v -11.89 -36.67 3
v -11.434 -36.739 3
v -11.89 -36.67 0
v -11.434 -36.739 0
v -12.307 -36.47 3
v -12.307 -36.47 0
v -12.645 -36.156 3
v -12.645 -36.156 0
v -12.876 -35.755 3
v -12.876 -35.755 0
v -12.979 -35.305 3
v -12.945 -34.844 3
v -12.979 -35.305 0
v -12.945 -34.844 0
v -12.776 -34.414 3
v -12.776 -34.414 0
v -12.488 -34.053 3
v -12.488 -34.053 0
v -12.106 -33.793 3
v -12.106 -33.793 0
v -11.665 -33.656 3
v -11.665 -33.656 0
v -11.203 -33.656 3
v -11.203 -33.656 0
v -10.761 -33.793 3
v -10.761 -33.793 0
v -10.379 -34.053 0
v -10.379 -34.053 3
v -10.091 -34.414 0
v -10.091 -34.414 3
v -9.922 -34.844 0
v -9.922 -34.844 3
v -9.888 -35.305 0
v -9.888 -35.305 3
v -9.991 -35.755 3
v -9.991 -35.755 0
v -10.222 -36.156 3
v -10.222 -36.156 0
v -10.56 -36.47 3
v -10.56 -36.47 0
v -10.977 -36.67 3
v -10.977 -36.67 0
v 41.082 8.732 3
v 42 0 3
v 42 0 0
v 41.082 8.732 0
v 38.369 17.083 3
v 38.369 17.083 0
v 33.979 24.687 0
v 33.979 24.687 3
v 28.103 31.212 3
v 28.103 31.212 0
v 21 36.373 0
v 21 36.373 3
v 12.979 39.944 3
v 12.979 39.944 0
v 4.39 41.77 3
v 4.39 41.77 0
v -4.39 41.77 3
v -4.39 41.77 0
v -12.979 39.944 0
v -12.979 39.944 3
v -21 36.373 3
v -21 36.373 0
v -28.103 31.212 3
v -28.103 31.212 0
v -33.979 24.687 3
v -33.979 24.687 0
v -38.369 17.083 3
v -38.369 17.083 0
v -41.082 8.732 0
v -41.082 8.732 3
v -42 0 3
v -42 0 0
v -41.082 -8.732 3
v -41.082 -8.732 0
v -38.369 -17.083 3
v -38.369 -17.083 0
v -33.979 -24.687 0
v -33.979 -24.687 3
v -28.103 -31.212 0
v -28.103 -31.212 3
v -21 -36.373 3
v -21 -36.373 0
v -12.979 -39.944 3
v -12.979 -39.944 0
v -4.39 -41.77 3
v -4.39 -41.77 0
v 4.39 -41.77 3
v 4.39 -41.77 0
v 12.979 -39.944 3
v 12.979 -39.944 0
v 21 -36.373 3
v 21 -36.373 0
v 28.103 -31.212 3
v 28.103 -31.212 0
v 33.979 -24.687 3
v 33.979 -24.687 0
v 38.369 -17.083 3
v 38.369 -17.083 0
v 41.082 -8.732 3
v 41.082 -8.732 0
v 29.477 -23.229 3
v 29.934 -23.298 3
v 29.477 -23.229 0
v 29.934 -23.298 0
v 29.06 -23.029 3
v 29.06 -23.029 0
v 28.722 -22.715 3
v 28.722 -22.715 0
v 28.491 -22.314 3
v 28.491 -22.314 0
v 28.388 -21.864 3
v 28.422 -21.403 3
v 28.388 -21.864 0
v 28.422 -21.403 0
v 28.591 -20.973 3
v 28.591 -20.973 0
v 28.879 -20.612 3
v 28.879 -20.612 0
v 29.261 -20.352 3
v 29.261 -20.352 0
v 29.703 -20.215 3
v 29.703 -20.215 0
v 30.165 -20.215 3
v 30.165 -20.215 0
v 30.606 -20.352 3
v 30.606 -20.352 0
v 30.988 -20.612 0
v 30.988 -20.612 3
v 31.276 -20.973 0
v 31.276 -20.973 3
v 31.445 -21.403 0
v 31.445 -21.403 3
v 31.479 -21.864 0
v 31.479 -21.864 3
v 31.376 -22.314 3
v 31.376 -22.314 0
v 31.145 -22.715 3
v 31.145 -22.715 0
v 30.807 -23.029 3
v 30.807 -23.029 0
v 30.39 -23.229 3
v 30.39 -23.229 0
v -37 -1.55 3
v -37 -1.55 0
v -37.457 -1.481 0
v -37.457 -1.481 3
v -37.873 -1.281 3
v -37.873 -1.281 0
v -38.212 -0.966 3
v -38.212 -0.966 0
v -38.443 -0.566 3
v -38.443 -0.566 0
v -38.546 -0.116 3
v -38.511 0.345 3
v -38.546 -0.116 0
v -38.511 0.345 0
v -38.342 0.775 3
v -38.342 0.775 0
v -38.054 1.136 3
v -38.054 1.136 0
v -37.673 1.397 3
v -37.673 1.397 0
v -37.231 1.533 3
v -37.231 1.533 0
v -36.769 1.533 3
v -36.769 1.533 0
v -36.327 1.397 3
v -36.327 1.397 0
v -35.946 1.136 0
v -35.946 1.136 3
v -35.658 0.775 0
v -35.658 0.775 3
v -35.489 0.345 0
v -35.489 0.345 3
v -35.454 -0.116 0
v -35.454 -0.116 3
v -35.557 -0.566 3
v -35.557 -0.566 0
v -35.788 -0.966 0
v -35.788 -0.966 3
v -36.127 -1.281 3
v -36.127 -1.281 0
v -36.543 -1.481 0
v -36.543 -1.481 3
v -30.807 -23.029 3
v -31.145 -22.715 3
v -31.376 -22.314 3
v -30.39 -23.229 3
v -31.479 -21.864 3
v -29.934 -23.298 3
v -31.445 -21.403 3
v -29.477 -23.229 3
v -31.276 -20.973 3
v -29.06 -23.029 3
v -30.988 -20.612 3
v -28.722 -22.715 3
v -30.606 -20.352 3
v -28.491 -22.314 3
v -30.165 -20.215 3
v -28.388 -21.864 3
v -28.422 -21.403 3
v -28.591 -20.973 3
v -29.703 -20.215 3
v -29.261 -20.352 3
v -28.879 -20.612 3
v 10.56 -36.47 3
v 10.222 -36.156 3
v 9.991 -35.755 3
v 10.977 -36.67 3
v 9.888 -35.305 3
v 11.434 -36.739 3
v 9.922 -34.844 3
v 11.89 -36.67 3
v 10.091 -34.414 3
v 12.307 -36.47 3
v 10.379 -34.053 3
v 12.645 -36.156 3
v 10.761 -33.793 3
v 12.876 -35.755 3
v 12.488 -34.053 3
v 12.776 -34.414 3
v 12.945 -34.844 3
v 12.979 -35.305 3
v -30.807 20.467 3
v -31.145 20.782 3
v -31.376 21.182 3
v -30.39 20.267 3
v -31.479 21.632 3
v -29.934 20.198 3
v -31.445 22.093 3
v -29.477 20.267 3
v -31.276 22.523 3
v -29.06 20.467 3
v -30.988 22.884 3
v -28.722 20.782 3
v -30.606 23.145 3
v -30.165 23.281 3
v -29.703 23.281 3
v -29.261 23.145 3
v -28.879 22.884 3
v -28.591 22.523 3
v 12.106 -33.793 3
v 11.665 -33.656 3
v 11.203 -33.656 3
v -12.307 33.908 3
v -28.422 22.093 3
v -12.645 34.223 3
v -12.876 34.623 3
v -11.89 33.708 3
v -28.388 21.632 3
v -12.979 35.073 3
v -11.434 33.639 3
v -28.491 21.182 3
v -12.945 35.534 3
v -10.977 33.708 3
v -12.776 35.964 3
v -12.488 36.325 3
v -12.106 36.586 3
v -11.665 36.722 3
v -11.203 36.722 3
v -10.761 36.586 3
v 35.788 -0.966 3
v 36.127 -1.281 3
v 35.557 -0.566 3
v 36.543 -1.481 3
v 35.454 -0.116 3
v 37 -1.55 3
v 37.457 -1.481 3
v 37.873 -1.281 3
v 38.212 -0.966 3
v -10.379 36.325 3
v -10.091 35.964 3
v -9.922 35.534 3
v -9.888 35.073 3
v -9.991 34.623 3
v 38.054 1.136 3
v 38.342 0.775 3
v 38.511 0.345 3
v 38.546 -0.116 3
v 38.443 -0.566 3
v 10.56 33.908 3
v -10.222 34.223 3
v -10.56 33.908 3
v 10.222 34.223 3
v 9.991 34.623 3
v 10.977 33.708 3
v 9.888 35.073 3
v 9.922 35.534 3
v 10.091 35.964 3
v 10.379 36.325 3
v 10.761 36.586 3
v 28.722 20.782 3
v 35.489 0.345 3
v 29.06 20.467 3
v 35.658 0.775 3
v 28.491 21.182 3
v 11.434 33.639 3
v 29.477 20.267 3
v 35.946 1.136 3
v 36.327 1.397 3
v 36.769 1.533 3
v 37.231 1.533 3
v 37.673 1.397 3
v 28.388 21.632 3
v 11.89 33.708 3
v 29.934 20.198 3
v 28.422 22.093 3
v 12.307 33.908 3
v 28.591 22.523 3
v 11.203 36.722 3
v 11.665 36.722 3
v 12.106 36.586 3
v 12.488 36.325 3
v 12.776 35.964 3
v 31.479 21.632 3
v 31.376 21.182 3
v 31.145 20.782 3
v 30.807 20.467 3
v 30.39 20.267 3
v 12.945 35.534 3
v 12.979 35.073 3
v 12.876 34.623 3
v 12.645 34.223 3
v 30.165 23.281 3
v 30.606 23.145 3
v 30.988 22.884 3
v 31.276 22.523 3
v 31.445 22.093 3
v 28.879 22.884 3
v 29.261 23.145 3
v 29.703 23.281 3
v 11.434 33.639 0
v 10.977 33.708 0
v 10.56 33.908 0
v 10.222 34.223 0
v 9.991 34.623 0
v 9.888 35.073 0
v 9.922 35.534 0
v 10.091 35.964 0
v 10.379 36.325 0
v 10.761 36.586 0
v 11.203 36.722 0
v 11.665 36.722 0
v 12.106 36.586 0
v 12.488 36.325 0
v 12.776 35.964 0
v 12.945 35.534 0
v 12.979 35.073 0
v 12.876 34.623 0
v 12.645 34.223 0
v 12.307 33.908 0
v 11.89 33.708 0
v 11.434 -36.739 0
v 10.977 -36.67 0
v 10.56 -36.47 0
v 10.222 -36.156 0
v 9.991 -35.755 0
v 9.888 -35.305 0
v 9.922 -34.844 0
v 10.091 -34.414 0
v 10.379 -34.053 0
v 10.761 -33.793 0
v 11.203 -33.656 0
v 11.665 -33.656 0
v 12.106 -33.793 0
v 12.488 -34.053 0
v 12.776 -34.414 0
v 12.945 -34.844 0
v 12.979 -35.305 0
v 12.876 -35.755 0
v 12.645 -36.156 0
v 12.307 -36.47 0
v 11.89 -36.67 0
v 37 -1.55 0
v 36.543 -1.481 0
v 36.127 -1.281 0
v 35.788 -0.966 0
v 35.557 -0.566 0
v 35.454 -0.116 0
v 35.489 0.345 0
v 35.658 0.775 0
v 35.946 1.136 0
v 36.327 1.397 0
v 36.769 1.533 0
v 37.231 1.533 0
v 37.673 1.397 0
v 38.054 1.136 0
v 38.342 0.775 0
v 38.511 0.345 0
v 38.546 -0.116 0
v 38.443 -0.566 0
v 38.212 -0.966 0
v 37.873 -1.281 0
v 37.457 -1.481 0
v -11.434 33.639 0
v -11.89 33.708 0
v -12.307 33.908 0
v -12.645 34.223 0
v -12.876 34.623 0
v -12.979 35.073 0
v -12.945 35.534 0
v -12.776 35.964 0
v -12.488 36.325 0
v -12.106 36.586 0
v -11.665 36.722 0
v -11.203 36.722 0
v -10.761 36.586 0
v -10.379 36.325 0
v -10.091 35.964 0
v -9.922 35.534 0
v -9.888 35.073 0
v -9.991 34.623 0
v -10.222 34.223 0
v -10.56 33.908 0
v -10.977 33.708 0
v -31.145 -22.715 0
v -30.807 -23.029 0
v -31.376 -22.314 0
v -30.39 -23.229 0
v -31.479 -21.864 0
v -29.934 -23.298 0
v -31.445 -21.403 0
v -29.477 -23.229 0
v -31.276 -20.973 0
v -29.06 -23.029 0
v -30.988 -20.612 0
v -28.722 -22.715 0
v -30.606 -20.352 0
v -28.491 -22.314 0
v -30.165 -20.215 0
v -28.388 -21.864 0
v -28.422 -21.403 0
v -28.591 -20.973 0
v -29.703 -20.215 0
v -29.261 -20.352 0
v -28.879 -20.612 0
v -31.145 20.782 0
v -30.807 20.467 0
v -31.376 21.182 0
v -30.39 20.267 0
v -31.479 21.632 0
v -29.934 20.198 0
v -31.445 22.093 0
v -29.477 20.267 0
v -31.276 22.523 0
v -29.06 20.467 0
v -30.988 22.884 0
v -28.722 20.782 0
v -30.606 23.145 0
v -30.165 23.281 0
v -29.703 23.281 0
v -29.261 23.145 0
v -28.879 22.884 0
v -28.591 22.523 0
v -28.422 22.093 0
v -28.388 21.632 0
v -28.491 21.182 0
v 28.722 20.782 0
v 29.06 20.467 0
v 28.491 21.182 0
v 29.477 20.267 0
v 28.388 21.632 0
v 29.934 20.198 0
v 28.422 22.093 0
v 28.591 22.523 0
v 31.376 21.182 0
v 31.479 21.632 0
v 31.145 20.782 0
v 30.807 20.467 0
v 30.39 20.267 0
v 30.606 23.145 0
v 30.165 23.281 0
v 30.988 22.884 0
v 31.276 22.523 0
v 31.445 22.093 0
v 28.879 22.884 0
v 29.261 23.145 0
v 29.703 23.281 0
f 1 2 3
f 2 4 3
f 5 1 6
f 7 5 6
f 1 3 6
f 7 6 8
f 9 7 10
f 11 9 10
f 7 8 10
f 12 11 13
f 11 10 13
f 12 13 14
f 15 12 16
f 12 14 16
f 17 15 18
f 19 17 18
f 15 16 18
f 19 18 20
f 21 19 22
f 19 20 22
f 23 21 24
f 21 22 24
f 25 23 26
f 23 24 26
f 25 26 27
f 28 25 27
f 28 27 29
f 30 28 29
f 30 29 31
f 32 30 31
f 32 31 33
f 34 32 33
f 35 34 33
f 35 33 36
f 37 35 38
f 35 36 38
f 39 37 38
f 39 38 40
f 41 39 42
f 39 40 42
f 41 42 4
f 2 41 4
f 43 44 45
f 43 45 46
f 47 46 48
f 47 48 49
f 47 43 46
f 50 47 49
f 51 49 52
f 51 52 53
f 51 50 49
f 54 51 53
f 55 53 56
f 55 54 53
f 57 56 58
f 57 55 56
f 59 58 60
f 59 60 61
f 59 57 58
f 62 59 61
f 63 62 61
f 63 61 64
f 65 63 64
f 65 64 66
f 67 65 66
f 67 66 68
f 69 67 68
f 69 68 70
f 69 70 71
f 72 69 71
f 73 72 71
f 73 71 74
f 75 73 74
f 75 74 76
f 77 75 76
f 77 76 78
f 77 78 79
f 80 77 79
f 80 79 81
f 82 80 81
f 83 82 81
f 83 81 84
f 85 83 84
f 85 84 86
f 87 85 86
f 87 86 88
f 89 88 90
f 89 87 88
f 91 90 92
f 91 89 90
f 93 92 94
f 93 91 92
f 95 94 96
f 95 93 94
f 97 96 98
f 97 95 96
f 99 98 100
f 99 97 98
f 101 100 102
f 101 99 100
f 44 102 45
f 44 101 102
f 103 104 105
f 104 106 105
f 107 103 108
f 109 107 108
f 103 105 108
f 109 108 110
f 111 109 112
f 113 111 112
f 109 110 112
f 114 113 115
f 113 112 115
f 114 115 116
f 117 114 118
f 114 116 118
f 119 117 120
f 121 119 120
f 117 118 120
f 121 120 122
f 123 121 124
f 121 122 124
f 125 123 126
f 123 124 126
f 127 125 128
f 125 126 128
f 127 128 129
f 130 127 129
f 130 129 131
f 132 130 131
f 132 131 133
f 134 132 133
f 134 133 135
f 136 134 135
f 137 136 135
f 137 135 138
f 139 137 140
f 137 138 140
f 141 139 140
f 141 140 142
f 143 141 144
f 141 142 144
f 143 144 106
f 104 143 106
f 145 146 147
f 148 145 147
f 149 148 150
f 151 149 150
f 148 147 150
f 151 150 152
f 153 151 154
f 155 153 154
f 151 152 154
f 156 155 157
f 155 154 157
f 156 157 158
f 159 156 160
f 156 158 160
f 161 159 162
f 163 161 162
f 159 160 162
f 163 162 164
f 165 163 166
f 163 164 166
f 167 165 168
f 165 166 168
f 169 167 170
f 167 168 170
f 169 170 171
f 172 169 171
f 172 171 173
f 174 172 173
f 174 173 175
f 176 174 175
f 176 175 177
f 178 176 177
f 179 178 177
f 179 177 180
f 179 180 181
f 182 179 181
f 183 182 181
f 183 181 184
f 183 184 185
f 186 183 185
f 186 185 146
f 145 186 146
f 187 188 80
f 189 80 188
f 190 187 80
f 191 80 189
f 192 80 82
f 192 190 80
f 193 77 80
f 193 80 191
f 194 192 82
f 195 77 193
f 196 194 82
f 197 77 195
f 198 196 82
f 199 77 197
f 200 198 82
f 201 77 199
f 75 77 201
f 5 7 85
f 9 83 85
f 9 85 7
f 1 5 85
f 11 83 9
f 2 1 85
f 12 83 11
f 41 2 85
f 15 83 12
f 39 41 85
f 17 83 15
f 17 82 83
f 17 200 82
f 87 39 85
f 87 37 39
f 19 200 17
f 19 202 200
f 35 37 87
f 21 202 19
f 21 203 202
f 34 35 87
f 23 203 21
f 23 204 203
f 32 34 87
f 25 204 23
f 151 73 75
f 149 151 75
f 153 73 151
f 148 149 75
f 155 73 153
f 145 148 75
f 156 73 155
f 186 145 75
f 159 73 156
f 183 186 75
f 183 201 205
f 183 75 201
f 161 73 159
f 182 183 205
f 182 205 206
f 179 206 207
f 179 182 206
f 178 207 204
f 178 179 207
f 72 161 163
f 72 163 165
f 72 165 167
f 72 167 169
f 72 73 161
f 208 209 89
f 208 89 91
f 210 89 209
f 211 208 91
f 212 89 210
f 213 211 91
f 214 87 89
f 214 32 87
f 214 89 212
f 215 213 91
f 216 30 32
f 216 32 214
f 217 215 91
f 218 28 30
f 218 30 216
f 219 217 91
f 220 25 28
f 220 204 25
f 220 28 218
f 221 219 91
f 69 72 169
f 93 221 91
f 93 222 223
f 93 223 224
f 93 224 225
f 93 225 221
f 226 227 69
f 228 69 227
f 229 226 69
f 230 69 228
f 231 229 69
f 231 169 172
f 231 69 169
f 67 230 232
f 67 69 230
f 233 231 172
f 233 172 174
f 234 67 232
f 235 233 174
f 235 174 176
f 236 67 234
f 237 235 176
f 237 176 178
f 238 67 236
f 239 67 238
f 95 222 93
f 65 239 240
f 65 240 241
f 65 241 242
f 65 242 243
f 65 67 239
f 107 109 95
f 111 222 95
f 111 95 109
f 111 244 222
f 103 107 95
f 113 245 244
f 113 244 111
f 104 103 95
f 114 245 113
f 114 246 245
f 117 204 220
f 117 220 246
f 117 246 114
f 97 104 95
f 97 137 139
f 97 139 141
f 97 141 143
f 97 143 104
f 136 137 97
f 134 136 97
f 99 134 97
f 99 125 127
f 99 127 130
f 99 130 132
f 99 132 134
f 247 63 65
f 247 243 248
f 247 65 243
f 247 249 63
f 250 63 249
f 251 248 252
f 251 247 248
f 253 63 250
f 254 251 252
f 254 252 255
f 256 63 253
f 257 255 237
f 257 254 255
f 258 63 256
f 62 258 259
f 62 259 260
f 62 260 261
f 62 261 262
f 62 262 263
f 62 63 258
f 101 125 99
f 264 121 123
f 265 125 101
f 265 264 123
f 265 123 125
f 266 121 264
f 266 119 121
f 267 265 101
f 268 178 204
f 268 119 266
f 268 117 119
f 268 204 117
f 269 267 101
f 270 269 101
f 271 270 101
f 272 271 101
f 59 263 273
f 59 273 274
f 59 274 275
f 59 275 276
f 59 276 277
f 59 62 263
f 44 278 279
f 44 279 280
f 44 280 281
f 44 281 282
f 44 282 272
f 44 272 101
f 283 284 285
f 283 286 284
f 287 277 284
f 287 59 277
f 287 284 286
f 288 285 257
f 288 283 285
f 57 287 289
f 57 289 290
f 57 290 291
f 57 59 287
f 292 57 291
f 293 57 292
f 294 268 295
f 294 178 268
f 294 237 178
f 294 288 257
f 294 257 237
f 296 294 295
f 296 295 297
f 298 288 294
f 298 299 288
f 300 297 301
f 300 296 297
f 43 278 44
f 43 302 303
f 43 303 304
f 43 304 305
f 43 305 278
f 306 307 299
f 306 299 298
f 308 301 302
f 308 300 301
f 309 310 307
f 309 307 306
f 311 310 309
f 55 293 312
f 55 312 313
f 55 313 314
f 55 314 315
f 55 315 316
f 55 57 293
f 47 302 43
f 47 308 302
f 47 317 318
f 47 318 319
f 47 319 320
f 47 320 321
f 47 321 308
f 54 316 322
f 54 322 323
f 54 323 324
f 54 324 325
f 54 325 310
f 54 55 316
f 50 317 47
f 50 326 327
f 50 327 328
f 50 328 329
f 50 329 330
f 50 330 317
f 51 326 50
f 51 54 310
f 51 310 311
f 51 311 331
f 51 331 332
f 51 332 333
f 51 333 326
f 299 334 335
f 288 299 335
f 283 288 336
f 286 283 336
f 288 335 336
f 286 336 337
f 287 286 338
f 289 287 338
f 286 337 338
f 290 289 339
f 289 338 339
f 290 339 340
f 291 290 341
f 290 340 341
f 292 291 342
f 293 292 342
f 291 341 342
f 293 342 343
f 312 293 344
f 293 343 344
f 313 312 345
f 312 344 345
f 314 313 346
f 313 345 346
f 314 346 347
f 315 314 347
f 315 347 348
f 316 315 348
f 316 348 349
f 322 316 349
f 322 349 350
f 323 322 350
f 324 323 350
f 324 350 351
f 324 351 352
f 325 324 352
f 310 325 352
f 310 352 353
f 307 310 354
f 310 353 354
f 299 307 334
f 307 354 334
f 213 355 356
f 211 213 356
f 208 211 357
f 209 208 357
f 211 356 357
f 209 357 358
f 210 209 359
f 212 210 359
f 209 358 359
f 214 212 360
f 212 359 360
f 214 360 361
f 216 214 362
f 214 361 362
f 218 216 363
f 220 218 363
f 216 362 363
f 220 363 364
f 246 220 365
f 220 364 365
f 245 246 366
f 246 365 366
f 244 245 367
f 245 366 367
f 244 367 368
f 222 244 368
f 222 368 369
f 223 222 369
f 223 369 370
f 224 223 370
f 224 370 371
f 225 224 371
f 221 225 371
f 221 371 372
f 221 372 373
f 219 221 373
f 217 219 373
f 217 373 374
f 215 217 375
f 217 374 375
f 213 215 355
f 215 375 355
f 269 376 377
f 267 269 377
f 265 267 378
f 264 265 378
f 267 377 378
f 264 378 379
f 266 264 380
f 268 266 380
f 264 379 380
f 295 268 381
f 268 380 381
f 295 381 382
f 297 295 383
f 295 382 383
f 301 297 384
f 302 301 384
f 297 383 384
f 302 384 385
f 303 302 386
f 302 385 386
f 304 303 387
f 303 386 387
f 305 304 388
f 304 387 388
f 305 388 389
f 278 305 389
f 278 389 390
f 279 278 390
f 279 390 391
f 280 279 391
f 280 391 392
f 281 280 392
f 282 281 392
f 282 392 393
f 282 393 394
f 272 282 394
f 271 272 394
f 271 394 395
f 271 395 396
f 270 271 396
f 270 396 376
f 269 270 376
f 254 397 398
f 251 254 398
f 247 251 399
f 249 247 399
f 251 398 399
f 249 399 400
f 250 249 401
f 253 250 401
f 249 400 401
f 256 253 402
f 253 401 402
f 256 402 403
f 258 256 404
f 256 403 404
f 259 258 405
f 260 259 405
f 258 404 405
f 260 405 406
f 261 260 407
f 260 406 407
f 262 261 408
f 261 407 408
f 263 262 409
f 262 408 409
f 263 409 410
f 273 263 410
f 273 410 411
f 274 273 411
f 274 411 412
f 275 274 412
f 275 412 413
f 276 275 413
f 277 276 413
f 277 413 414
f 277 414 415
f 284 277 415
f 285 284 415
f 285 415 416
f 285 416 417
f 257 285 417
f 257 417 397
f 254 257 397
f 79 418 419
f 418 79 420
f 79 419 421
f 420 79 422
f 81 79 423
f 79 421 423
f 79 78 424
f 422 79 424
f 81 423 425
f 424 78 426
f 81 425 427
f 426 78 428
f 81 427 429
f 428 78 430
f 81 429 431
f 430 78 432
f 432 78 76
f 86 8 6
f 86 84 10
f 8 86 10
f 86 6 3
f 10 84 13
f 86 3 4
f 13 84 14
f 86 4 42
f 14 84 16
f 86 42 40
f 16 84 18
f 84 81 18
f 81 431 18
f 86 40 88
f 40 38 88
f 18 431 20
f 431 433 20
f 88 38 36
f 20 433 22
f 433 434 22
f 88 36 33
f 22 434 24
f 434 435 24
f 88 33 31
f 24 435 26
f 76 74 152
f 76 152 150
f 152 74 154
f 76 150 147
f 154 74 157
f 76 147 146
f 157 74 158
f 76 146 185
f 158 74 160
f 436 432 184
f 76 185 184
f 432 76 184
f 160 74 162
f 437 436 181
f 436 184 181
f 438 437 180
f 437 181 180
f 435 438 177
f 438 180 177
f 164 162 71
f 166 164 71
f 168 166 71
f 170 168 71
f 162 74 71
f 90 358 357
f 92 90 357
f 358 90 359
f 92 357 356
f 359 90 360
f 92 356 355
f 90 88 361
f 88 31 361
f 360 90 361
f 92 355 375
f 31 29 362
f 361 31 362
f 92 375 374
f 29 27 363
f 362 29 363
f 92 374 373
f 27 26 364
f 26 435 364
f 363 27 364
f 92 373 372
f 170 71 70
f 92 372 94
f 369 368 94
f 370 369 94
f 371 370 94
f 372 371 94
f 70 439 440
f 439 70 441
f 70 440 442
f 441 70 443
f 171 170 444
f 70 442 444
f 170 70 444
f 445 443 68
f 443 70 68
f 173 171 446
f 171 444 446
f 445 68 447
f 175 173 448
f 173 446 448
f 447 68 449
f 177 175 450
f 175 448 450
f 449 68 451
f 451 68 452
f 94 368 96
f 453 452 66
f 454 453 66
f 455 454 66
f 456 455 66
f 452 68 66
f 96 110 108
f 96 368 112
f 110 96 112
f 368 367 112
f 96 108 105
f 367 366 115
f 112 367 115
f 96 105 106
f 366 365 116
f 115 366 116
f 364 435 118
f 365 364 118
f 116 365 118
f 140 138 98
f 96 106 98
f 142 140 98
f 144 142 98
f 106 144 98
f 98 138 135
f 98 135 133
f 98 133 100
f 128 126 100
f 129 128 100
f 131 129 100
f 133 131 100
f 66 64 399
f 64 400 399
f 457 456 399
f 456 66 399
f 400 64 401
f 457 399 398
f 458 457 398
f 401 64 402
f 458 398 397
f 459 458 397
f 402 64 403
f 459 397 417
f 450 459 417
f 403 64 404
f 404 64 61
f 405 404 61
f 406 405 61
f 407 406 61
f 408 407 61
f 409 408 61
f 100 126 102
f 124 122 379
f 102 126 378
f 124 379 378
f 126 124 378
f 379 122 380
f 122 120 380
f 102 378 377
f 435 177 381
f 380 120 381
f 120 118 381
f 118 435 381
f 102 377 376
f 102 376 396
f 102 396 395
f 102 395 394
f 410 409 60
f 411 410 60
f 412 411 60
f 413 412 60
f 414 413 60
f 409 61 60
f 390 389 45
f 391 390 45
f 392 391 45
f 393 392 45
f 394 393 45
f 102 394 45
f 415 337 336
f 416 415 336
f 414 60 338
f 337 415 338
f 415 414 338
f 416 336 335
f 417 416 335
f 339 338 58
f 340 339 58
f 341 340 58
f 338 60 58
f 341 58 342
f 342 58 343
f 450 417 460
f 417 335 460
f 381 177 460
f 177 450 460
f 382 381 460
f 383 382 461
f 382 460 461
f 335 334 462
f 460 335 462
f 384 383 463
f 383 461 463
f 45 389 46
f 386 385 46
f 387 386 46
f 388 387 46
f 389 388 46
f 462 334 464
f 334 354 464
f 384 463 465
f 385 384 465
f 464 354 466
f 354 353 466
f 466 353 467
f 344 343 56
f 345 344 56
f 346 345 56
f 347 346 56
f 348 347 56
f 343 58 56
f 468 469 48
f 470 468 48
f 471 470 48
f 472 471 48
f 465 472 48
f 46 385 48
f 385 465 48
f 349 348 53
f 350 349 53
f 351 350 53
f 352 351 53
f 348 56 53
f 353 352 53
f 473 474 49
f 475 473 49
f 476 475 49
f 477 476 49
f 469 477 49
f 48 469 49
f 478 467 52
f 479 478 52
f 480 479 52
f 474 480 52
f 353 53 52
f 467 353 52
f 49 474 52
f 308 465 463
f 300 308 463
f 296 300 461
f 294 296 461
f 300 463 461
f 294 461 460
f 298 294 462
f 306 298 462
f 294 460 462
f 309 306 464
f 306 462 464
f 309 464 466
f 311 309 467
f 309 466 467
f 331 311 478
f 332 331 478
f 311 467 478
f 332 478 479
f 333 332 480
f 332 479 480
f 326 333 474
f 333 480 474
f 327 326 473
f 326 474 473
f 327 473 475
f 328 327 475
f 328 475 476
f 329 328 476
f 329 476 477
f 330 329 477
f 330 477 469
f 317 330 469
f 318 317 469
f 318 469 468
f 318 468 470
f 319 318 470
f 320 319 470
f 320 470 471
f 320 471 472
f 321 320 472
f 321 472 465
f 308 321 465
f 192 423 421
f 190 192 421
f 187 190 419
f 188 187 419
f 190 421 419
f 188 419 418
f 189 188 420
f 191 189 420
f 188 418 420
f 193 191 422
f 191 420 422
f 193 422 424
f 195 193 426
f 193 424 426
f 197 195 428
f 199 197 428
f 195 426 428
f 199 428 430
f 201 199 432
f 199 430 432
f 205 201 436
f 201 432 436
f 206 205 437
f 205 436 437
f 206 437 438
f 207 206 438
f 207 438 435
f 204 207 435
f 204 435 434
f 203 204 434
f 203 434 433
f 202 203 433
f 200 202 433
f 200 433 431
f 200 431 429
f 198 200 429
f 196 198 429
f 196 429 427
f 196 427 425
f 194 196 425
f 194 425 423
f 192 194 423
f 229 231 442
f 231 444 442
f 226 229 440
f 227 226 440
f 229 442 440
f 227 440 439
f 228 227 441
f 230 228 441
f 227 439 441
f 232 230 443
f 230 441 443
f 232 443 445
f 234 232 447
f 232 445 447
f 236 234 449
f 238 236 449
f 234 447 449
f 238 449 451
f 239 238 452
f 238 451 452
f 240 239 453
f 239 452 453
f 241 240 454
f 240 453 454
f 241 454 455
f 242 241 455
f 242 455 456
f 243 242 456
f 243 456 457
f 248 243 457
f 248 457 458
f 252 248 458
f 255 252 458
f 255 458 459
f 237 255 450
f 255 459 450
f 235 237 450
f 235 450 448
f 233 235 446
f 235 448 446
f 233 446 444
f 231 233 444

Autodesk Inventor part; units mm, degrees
ref_plane "YZ Plane" through (0, 0, 0) normal (1, 0, 0) x (0, 1, 0)
ref_plane "XZ Plane" through (0, 0, 0) normal (0, 1, 0) x (-1, 0, 0)
ref_plane "Work Plane1" through (0, 0, 0) normal (0, 0, 1) x (1, 0, 0)
sketch "Sketch1" plane through (0, 0, 0) normal (0, 0, 1) x (1, 0, 0)
  circle A0 centre (0, 0) radius 40 projected
  circle A1 centre (0, 0) radius 40 projected
  circle A2 centre (37, 0) radius 1.4 projected
  circle A3 centre (29.9336, 21.7481) radius 1.4 projected
  circle A4 centre (11.4336, 35.1891) radius 1.4 projected
  circle A5 centre (-11.4336, 35.1891) radius 1.4 projected
  circle A6 centre (-29.9336, 21.7481) radius 1.4 projected
  circle A7 centre (-37, 0) radius 1.4 projected
  circle A8 centre (-29.9336, -21.7481) radius 1.4 projected
  circle A9 centre (-11.4336, -35.1891) radius 1.4 projected
  circle A10 centre (11.4336, -35.1891) radius 1.4 projected
  circle A11 centre (29.9336, -21.7481) radius 1.4 projected
  circle A12 centre (0, 0) radius 42
  circle A13 centre (0, 0) radius 18.5 projected
  point P0 (0, 0)
  dimension "d9" = 2
extrude "Extrusion1" add sketch "Sketch1" along normal blind 3 contours A0 | A13
sketch "Sketch2" plane through (0, 0, 3) normal (0, 0, 1) x (1, 0, 0)
  circle A0 centre (0, 0) radius 40 projected
  circle A1 centre (29.9336, -21.7481) radius 1.4 projected
  circle A2 centre (11.4336, -35.1891) radius 1.4 projected
  circle A3 centre (-11.4336, -35.1891) radius 1.4 projected
  circle A4 centre (-29.9336, -21.7481) radius 1.4 projected
  circle A5 centre (-37, 0) radius 1.4 projected
  circle A6 centre (-29.9336, 21.7481) radius 1.4 projected
  circle A7 centre (-11.4336, 35.1891) radius 1.4 projected
  circle A8 centre (11.4336, 35.1891) radius 1.4 projected
  circle A9 centre (29.9336, 21.7481) radius 1.4 projected
  circle A10 centre (37, 0) radius 1.4 projected
  point P0 (0, 0)
hole "Hole1" at (29.9336, 21.7481, 3) at (37, 0, 3) at (29.9336, -21.7481, 3) at (11.4336, -35.1891, 3) at (-11.4336, -35.1891, 3) at (-29.9336, -21.7481, 3) at (-37, 0, 3) at (-29.9336, 21.7481, 3) at (-11.4336, 35.1891, 3) at (11.4336, 35.1891, 3) direction (0, 0, -1) diameter 3.1 end through all
sketch "Sketch3" plane through (0, 0, 3) normal (0, 0, 1) x (1, 0, 0)
  circle A0 centre (0, 0) radius 40 projected
  circle A1 centre (0, 0) radius 42
  point P0 (0, 0)
  dimension "d10" = 2
ref_plane "Work Plane2" through (-40, -40, 0) normal (0, 0, 1) x (1, 0, 0)
extrude "Extrusion2" add sketch "Sketch3" against normal up to surface (3 mm away)
sketch "Sketch4" plane through (0, 0, 3) normal (0, 0, 1) x (1, 0, 0)
  circle A0 centre (0, 0) radius 42 projected
  circle A1 centre (-11.4336, 35.1891) radius 1.55 projected
  circle A2 centre (-37, 0) radius 1.55 projected
  circle A3 centre (-11.4336, -35.1891) radius 1.55 projected
  circle A4 centre (29.9336, -21.7481) radius 1.55 projected
  circle A5 centre (29.9336, 21.7481) radius 1.55 projected
  circle A6 centre (37, 0) radius 1.55 projected
  circle A7 centre (11.4336, -35.1891) radius 1.55 projected
  circle A8 centre (-29.9336, -21.7481) radius 1.55 projected
  circle A9 centre (-29.9336, 21.7481) radius 1.55 projected
  circle A10 centre (11.4336, 35.1891) radius 1.55 projected
  point P0 (0, 0)
properties part number "Anglerfish_Frontwindow_v0"
